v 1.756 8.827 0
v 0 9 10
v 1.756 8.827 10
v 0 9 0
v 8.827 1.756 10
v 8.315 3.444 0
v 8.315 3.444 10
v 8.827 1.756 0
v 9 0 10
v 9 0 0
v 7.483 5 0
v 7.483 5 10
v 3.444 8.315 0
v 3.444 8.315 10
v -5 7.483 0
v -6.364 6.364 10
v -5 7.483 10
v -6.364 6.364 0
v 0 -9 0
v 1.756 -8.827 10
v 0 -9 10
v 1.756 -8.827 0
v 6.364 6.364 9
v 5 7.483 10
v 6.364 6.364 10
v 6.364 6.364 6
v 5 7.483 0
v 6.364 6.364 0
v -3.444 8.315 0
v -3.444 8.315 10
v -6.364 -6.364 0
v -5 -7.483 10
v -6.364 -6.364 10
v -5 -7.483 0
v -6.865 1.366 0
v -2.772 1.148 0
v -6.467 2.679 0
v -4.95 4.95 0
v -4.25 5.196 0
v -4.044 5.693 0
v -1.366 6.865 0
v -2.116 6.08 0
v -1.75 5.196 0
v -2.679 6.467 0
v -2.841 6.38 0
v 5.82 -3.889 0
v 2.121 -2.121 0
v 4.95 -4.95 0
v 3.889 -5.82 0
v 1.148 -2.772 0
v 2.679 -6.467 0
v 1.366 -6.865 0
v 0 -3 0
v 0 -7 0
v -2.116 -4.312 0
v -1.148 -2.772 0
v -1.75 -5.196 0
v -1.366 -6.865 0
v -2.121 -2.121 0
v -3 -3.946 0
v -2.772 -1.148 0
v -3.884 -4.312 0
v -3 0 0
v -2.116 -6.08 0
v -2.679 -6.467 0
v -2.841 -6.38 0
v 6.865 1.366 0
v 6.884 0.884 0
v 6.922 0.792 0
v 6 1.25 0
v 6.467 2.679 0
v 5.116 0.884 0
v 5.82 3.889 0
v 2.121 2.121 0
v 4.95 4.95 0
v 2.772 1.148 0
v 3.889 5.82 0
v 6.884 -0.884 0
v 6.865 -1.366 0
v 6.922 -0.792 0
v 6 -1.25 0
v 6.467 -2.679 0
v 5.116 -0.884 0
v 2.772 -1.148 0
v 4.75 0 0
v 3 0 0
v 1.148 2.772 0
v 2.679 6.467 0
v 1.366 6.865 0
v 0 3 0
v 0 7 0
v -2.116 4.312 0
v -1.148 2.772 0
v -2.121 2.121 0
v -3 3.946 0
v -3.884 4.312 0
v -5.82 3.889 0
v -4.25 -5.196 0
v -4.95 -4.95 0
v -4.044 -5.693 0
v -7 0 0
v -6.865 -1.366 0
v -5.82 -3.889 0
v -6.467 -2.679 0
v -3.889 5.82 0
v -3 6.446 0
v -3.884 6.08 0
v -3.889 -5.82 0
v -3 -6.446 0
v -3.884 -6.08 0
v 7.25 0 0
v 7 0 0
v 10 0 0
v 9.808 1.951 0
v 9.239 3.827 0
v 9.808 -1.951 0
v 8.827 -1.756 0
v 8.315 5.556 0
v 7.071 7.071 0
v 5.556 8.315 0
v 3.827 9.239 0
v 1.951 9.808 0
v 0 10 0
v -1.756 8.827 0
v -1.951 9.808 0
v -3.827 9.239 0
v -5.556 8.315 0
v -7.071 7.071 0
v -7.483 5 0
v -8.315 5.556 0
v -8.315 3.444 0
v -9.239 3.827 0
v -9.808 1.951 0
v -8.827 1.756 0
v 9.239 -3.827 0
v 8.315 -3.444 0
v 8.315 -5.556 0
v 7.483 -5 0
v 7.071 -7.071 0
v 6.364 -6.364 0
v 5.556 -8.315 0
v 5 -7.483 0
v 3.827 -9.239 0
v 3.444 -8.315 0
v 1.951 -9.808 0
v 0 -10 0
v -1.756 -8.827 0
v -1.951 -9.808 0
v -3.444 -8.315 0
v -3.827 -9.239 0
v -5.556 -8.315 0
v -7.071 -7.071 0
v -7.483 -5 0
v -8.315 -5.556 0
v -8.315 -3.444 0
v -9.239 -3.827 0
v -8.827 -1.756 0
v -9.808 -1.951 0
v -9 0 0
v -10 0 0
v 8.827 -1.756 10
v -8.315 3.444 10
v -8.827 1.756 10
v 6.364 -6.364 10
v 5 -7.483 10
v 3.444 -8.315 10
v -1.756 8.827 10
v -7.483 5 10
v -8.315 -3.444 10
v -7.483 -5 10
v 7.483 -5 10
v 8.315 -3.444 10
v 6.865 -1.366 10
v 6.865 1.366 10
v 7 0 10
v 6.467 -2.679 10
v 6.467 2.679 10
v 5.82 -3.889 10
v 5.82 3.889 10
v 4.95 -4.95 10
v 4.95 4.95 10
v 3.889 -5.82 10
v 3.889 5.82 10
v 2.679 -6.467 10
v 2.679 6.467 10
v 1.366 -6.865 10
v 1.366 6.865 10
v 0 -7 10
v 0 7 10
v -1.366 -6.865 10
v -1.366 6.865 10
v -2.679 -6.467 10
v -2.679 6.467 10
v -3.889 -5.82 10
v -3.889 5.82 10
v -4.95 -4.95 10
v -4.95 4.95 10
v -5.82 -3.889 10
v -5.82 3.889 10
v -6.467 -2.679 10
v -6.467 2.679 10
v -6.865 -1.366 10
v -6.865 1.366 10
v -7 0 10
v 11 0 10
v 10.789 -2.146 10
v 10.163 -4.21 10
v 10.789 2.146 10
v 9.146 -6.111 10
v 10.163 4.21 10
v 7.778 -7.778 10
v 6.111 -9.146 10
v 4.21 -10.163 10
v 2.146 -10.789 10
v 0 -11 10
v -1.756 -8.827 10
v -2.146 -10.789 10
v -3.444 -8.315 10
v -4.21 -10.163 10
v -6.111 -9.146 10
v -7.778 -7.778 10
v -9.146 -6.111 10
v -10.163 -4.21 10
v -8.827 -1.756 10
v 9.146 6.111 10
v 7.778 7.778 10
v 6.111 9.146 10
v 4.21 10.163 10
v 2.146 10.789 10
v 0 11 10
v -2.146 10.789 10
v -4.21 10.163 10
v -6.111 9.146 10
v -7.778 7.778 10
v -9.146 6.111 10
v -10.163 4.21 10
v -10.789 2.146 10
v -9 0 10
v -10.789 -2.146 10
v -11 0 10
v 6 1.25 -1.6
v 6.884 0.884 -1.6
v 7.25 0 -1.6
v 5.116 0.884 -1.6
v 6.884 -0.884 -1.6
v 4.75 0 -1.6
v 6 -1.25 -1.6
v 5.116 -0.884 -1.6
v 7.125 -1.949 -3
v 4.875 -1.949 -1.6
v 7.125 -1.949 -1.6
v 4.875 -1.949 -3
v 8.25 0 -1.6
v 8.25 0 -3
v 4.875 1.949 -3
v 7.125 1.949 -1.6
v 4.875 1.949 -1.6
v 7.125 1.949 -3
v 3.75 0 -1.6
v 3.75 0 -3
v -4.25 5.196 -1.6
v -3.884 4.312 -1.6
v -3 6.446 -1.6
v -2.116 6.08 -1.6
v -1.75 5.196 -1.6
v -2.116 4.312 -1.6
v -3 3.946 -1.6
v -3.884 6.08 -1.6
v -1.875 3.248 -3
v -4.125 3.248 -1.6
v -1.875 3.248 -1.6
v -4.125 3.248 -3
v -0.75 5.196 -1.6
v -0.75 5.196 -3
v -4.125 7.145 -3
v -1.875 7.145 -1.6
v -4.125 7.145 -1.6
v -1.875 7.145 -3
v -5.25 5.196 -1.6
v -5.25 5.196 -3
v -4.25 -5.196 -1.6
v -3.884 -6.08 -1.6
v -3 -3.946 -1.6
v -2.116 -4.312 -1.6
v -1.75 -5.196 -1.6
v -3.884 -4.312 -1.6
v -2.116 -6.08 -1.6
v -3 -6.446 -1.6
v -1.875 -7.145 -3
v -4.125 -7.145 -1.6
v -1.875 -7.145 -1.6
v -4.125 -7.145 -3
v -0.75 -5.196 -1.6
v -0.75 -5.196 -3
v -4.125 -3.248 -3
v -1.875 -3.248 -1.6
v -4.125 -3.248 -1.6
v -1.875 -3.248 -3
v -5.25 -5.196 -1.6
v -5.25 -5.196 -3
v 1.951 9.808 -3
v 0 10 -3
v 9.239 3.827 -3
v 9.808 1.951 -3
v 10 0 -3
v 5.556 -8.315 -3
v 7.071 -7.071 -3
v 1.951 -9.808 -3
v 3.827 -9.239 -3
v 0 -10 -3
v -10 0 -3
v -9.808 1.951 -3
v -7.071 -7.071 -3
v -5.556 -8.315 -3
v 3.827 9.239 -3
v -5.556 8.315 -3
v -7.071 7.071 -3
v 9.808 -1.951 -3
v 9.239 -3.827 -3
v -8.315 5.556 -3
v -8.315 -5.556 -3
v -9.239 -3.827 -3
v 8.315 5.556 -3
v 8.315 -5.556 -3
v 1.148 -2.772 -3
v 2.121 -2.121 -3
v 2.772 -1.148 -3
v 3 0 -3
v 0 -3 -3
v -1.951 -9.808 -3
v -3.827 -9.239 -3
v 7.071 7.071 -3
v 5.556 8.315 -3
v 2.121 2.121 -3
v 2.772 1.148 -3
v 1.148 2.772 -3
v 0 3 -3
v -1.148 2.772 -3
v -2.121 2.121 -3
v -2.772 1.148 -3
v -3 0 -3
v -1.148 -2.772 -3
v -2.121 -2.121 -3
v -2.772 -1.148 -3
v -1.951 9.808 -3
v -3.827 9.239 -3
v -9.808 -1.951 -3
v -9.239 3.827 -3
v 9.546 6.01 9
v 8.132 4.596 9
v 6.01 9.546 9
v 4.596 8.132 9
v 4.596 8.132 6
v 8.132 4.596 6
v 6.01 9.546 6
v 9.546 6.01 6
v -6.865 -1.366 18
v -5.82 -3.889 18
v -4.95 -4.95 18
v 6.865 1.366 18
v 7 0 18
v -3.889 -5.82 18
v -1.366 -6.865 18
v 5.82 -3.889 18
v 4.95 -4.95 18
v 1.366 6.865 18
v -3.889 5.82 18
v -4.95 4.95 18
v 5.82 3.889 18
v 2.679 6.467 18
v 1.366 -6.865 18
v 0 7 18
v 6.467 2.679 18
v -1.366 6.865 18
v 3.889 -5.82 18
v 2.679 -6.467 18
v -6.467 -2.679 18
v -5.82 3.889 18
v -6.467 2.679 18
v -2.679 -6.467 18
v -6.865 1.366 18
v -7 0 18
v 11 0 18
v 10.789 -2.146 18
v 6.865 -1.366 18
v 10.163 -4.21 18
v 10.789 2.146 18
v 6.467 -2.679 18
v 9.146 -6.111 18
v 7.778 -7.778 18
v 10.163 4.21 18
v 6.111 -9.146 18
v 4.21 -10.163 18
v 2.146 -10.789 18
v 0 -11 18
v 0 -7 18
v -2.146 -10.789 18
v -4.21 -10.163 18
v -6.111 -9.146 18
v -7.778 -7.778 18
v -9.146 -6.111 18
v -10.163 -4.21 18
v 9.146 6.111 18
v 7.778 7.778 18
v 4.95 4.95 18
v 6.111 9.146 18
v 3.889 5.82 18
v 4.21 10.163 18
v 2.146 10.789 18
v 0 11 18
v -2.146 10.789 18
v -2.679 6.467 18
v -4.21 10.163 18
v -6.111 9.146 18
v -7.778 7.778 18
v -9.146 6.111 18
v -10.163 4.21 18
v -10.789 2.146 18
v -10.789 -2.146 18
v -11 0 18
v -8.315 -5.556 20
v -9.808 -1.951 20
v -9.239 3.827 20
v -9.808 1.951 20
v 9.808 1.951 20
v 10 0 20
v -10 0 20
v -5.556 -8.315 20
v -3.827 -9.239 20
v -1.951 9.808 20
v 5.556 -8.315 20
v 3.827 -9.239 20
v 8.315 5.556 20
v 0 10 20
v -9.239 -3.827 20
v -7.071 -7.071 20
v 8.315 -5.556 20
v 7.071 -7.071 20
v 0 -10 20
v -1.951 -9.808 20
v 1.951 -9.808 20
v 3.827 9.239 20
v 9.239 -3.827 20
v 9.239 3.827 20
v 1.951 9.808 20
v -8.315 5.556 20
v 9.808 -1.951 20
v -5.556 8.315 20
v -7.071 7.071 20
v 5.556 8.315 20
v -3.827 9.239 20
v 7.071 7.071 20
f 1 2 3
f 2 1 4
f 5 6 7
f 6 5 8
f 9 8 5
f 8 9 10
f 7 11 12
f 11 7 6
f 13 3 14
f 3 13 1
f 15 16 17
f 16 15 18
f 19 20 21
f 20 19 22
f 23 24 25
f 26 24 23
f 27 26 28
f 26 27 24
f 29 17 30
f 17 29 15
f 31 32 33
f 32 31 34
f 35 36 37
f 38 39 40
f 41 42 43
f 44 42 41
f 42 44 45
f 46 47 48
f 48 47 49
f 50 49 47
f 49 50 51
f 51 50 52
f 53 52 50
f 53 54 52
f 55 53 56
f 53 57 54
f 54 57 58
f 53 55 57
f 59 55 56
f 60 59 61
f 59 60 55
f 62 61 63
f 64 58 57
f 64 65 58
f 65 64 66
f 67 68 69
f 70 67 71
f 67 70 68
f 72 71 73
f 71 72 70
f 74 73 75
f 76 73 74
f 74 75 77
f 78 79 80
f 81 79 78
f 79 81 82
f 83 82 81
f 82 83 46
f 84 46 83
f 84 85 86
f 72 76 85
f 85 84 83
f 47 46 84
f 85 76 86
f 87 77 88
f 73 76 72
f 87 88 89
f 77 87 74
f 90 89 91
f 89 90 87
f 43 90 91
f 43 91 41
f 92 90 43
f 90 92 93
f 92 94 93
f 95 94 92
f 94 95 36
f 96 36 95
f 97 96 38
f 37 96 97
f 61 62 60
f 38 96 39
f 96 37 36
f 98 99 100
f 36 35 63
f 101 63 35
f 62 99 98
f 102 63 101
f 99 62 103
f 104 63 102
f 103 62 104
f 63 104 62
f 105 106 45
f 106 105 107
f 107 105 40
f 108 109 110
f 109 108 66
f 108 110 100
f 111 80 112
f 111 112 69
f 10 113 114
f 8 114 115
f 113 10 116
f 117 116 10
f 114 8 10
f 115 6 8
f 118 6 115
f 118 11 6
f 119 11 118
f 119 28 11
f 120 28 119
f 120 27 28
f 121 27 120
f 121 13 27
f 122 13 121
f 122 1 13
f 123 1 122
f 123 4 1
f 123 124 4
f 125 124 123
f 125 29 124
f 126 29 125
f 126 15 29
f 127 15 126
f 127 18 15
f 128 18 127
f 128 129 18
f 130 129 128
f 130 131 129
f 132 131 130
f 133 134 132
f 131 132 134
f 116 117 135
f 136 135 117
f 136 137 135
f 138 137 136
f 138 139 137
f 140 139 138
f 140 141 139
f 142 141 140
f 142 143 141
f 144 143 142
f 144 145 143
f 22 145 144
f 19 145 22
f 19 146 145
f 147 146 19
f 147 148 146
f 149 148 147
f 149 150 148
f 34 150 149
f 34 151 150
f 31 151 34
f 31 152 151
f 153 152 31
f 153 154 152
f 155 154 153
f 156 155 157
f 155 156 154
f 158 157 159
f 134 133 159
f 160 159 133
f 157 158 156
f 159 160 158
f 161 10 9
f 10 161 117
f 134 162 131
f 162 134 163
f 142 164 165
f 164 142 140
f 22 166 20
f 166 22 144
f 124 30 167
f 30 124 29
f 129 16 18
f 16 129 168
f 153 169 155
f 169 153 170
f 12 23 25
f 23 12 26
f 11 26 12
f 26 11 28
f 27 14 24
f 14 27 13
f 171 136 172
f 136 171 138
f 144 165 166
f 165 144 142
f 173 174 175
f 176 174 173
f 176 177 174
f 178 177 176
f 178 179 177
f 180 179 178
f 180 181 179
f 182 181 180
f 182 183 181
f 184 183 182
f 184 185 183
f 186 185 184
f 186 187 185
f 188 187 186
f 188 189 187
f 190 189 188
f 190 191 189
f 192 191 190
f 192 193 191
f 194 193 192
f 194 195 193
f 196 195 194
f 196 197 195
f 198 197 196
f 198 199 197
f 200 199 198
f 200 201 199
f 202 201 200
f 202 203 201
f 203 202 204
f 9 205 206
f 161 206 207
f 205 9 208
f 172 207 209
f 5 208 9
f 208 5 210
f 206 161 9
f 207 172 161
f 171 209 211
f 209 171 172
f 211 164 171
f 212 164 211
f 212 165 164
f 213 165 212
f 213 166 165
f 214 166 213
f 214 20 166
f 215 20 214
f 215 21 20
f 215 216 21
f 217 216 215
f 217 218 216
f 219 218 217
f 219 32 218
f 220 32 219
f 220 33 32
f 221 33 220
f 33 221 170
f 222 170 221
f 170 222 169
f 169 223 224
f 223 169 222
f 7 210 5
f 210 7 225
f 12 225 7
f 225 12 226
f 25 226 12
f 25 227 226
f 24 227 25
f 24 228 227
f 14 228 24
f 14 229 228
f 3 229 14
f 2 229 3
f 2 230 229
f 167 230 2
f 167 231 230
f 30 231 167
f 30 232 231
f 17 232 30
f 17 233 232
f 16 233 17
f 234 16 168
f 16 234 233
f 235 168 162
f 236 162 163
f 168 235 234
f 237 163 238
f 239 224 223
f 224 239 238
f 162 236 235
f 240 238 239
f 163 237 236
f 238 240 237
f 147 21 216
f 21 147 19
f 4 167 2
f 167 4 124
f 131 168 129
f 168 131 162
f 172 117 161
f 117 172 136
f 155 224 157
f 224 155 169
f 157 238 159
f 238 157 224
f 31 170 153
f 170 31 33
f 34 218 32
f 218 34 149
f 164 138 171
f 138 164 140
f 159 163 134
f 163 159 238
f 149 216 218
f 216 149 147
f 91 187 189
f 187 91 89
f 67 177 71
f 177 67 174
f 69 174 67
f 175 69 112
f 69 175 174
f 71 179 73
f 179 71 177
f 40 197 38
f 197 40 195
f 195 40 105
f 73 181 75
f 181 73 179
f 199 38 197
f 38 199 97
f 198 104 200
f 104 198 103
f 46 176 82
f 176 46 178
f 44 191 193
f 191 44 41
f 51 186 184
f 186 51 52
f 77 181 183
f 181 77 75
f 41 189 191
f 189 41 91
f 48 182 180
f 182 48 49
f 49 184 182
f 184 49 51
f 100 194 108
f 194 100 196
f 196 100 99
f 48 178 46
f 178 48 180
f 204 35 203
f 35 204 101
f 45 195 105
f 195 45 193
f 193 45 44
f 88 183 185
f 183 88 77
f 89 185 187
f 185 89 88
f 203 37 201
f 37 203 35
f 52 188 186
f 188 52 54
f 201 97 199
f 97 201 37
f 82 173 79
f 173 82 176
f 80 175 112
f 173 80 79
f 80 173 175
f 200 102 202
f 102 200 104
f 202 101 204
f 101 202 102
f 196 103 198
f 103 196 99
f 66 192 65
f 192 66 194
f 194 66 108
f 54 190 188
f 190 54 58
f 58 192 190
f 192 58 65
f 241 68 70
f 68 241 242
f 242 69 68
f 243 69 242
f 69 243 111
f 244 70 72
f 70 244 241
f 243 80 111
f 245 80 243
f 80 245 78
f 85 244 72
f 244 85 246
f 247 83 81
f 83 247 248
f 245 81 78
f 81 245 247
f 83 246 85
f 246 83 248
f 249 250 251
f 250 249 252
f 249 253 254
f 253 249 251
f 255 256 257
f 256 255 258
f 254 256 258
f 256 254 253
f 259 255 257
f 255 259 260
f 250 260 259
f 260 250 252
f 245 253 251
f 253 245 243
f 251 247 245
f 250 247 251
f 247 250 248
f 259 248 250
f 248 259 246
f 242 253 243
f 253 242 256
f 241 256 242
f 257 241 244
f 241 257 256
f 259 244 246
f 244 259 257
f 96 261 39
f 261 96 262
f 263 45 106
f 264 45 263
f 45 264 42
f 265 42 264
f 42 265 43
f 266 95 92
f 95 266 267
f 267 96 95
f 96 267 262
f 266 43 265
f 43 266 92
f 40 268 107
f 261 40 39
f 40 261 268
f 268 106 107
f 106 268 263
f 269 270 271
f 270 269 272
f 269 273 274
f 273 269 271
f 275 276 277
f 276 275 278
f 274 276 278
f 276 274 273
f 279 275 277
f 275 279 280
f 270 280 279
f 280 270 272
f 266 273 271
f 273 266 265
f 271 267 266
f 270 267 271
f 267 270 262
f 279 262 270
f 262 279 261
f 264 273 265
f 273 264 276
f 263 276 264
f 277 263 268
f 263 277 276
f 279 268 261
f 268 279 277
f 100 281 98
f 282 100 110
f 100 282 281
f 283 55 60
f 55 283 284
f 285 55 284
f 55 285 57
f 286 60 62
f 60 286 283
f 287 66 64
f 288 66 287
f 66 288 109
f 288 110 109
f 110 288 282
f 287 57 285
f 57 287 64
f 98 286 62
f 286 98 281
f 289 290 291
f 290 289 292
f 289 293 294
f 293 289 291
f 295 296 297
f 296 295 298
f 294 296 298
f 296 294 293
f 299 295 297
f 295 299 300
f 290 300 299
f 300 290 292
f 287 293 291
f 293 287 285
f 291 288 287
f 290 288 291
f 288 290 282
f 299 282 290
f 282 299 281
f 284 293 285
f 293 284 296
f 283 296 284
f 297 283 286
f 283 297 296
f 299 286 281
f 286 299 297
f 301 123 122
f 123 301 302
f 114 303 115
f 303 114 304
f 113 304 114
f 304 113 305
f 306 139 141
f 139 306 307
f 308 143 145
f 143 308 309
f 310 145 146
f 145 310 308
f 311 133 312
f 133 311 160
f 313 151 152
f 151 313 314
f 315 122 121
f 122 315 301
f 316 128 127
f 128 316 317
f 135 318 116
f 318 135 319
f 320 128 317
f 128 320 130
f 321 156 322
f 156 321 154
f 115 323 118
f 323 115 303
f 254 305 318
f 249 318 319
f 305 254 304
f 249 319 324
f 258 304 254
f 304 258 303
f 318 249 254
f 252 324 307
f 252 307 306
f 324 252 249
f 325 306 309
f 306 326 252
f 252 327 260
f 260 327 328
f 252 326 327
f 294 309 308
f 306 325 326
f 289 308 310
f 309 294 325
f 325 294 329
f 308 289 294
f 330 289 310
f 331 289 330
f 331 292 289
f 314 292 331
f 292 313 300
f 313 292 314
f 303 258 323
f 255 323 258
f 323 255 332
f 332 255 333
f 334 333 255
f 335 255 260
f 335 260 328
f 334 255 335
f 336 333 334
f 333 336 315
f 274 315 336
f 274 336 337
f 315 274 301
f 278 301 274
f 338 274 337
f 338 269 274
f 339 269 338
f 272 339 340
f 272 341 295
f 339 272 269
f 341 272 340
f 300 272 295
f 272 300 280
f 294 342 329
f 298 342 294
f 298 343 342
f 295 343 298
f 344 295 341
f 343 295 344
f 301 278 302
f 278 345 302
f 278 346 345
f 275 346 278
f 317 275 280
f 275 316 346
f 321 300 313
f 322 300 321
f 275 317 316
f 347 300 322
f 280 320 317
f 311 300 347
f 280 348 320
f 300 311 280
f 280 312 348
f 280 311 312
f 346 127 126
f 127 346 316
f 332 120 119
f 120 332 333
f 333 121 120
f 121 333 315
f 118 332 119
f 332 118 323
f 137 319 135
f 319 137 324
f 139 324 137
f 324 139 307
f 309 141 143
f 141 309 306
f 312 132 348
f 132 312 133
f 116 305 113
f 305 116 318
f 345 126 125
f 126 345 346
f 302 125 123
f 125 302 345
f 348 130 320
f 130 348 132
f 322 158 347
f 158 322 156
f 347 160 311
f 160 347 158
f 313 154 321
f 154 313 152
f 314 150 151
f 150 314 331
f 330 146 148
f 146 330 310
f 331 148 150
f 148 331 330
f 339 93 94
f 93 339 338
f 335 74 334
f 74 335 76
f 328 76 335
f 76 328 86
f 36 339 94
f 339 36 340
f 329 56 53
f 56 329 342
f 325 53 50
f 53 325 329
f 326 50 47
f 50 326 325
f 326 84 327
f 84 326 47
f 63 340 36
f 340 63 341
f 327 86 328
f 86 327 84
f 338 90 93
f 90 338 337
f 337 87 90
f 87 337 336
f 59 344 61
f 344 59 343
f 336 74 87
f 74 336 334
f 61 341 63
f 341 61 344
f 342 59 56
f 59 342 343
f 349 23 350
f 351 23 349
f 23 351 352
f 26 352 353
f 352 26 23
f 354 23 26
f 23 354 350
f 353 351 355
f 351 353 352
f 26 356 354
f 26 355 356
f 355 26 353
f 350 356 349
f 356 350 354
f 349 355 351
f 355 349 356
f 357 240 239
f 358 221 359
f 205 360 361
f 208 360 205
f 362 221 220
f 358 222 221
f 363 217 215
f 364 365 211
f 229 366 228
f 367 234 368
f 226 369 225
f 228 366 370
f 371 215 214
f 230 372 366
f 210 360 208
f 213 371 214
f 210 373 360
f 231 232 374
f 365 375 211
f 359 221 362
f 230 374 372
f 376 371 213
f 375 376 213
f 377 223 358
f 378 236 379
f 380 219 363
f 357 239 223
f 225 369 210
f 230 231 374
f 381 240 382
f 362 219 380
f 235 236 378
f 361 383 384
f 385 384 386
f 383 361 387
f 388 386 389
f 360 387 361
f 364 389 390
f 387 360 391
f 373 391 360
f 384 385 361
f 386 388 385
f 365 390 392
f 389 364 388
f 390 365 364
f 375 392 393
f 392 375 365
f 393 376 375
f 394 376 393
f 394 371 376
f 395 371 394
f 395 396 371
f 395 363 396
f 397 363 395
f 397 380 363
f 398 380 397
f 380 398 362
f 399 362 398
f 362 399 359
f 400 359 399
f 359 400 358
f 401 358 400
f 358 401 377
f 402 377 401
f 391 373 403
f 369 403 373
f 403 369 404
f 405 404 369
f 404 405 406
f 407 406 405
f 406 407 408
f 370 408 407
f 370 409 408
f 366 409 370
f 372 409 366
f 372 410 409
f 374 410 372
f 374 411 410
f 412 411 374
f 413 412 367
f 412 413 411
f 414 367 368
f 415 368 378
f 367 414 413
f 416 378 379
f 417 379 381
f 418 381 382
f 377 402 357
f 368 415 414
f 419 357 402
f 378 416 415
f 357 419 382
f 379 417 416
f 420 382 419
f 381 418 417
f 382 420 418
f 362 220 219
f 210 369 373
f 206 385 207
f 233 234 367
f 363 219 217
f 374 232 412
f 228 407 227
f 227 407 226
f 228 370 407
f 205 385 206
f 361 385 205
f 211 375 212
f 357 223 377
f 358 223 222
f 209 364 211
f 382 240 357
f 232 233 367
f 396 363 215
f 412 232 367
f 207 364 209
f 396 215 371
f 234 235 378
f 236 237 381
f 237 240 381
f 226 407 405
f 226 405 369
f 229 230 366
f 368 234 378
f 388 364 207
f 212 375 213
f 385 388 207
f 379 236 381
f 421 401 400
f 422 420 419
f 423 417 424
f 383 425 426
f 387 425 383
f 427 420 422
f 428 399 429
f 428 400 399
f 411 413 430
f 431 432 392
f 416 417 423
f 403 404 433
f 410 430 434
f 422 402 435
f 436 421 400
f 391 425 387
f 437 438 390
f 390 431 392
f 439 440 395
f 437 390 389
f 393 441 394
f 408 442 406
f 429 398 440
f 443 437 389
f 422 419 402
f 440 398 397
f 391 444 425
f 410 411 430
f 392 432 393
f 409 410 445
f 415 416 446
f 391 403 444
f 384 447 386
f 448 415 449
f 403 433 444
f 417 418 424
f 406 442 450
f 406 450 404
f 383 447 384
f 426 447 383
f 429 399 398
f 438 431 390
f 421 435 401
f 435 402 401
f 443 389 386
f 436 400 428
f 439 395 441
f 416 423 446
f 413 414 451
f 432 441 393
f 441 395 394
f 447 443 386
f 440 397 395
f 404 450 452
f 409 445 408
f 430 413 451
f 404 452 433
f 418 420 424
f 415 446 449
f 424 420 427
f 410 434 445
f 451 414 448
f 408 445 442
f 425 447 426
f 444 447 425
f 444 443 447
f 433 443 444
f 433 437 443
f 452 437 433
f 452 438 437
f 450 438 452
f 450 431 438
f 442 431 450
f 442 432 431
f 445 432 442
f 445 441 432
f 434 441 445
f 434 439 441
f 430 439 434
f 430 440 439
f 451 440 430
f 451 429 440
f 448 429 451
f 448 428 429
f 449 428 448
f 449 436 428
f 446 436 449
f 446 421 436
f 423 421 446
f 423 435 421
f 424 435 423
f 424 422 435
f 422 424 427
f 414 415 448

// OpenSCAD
// Weighing Cup for Coffee Bean Sorter — Buffer Cup Station
// HUSKY-SORTER-001
// Generated: 2026-04-13
//
// v2 2026-05-17: Critical structural fixes:
//  - Gate slot reduced from 12mm×4mm to 5mm×2mm (was overcutting into cup interior)
//  - Gate positioned at upper cup wall (z=6mm) for better bean release
//  - Funnel now converges to inner_diameter (14mm) for proper bean guidance
//  - Bottom plate flush with cup floor (was protruding 1.5mm below)
//  - M2 holes changed to through-holes with nut recess (was 1.5mm blind tap)
//  - Load cell center boss hole enlarged to φ6mm for proper alignment

// Parameters
inner_diameter = 14.0;
outer_diameter = 18.0;
wall_thickness = 2.0;
cup_height = 10.0;
inlet_diameter = 22.0;
funnel_height = 8.0;
bottom_thickness = 3.0;   // v2: 1.5->3.0mm for proper M2 through-hole + nut
total_height = cup_height + funnel_height + bottom_thickness;

// v2: Gate slot parameters — conservative sizing
gate_slot_width = 5.0;       // mm (was 12mm, too wide)
gate_slot_depth = 2.0;       // mm penetration into wall (was 4mm, overcut interior)
gate_slot_height = 3.0;      // mm (was 5mm)
gate_slot_z = 6.0;           // mm from cup bottom (was 3mm, too low)

// ========== Cup body (hollow cylinder) ==========
difference() {
    cylinder(h=cup_height, d=outer_diameter, $fn=32);
    translate([0, 0, -0.1])
        cylinder(h=cup_height+0.2, d=inner_diameter, $fn=32);
}

// ========== Solenoid gate slot (v2: conservative cut) ==========
// Slot only cuts through the 2mm wall thickness, not into interior
// Positioned at upper cup wall (z=6mm) for cleaner bean release
gate_angle = 45;
rotate([0, 0, gate_angle])
    translate([outer_diameter/2, -gate_slot_width/2, gate_slot_z])
        cube([gate_slot_depth, gate_slot_width, gate_slot_height]);

// ========== Funnel section (v2: converges to inner_diameter) ==========
// v1: converged to outer_diameter (18mm) — beans land on cup wall rim
// v2: converges to inner_diameter (14mm) — beans guided into cup interior
translate([0, 0, cup_height])
    cylinder(h=funnel_height, d1=inlet_diameter, d2=inner_diameter, $fn=32);

// ========== Inlet chamfer (ease bean entry) ==========
translate([0, 0, cup_height + funnel_height])
    cylinder(h=2, d1=inlet_diameter, d2=inlet_diameter-2, $fn=32);

// ========== Bottom mounting plate (v2: flush with cup floor) ==========
// v1: protruded 1.5mm below floor — interfered with load cell boss
// v2: sits at floor level (z=-bottom_thickness to z=0)
difference() {
    translate([0, 0, -bottom_thickness])
        cylinder(h=bottom_thickness, d=outer_diameter + 2, $fn=32);

    // v2: Load cell center boss hole — φ6mm for proper alignment
    // (was φ4mm, too small for standard 200g load cell M3/M4 boss)
    translate([0, 0, -bottom_thickness - 0.1])
        cylinder(h=bottom_thickness + 0.2, d=6, $fn=16);

    // v2: M2 through-holes (was blind holes in 1.5mm plate)
    // Through-holes allow M2 screw + nut on bottom side
    // Nut recess: 4mm hex nut sits in 2mm deep recess
    hole_radius = (outer_diameter / 2) - 3;  // v2: moved inward from 4mm
    for (i = [0:2]) {
        angle = i * 120;
        x = hole_radius * cos(angle);
        y = hole_radius * sin(angle);
        // M2 through-hole (φ2.5mm clearance)
        translate([x, y, -bottom_thickness - 0.1])
            cylinder(h=bottom_thickness + 0.2, d=2.5, $fn=8);
        // Nut recess on bottom side (φ4.5mm for M2 hex nut, 1.5mm deep)
        translate([x, y, -bottom_thickness - 0.1])
            cylinder(h=1.5, d=4.5, $fn=6);
    }
}

// Print settings:
//   Material: PETG (food grade)
//   Layer height: 0.12mm
//   Infill: 40%
//   Supports: funnel overhang needs supports
//
// v2 target weight: ≤5g (PETG, 40% infill)
//
// Assembly:
//   1. 3x M2×6mm screws from top through cup bottom
//   2. 3x M2 hex nuts recessed into bottom plate underside
//   3. Load cell boss fits into φ6mm center hole for alignment
//   4. Solenoid gate slides through 5×3mm slot at z=6mm (cup upper wall)
